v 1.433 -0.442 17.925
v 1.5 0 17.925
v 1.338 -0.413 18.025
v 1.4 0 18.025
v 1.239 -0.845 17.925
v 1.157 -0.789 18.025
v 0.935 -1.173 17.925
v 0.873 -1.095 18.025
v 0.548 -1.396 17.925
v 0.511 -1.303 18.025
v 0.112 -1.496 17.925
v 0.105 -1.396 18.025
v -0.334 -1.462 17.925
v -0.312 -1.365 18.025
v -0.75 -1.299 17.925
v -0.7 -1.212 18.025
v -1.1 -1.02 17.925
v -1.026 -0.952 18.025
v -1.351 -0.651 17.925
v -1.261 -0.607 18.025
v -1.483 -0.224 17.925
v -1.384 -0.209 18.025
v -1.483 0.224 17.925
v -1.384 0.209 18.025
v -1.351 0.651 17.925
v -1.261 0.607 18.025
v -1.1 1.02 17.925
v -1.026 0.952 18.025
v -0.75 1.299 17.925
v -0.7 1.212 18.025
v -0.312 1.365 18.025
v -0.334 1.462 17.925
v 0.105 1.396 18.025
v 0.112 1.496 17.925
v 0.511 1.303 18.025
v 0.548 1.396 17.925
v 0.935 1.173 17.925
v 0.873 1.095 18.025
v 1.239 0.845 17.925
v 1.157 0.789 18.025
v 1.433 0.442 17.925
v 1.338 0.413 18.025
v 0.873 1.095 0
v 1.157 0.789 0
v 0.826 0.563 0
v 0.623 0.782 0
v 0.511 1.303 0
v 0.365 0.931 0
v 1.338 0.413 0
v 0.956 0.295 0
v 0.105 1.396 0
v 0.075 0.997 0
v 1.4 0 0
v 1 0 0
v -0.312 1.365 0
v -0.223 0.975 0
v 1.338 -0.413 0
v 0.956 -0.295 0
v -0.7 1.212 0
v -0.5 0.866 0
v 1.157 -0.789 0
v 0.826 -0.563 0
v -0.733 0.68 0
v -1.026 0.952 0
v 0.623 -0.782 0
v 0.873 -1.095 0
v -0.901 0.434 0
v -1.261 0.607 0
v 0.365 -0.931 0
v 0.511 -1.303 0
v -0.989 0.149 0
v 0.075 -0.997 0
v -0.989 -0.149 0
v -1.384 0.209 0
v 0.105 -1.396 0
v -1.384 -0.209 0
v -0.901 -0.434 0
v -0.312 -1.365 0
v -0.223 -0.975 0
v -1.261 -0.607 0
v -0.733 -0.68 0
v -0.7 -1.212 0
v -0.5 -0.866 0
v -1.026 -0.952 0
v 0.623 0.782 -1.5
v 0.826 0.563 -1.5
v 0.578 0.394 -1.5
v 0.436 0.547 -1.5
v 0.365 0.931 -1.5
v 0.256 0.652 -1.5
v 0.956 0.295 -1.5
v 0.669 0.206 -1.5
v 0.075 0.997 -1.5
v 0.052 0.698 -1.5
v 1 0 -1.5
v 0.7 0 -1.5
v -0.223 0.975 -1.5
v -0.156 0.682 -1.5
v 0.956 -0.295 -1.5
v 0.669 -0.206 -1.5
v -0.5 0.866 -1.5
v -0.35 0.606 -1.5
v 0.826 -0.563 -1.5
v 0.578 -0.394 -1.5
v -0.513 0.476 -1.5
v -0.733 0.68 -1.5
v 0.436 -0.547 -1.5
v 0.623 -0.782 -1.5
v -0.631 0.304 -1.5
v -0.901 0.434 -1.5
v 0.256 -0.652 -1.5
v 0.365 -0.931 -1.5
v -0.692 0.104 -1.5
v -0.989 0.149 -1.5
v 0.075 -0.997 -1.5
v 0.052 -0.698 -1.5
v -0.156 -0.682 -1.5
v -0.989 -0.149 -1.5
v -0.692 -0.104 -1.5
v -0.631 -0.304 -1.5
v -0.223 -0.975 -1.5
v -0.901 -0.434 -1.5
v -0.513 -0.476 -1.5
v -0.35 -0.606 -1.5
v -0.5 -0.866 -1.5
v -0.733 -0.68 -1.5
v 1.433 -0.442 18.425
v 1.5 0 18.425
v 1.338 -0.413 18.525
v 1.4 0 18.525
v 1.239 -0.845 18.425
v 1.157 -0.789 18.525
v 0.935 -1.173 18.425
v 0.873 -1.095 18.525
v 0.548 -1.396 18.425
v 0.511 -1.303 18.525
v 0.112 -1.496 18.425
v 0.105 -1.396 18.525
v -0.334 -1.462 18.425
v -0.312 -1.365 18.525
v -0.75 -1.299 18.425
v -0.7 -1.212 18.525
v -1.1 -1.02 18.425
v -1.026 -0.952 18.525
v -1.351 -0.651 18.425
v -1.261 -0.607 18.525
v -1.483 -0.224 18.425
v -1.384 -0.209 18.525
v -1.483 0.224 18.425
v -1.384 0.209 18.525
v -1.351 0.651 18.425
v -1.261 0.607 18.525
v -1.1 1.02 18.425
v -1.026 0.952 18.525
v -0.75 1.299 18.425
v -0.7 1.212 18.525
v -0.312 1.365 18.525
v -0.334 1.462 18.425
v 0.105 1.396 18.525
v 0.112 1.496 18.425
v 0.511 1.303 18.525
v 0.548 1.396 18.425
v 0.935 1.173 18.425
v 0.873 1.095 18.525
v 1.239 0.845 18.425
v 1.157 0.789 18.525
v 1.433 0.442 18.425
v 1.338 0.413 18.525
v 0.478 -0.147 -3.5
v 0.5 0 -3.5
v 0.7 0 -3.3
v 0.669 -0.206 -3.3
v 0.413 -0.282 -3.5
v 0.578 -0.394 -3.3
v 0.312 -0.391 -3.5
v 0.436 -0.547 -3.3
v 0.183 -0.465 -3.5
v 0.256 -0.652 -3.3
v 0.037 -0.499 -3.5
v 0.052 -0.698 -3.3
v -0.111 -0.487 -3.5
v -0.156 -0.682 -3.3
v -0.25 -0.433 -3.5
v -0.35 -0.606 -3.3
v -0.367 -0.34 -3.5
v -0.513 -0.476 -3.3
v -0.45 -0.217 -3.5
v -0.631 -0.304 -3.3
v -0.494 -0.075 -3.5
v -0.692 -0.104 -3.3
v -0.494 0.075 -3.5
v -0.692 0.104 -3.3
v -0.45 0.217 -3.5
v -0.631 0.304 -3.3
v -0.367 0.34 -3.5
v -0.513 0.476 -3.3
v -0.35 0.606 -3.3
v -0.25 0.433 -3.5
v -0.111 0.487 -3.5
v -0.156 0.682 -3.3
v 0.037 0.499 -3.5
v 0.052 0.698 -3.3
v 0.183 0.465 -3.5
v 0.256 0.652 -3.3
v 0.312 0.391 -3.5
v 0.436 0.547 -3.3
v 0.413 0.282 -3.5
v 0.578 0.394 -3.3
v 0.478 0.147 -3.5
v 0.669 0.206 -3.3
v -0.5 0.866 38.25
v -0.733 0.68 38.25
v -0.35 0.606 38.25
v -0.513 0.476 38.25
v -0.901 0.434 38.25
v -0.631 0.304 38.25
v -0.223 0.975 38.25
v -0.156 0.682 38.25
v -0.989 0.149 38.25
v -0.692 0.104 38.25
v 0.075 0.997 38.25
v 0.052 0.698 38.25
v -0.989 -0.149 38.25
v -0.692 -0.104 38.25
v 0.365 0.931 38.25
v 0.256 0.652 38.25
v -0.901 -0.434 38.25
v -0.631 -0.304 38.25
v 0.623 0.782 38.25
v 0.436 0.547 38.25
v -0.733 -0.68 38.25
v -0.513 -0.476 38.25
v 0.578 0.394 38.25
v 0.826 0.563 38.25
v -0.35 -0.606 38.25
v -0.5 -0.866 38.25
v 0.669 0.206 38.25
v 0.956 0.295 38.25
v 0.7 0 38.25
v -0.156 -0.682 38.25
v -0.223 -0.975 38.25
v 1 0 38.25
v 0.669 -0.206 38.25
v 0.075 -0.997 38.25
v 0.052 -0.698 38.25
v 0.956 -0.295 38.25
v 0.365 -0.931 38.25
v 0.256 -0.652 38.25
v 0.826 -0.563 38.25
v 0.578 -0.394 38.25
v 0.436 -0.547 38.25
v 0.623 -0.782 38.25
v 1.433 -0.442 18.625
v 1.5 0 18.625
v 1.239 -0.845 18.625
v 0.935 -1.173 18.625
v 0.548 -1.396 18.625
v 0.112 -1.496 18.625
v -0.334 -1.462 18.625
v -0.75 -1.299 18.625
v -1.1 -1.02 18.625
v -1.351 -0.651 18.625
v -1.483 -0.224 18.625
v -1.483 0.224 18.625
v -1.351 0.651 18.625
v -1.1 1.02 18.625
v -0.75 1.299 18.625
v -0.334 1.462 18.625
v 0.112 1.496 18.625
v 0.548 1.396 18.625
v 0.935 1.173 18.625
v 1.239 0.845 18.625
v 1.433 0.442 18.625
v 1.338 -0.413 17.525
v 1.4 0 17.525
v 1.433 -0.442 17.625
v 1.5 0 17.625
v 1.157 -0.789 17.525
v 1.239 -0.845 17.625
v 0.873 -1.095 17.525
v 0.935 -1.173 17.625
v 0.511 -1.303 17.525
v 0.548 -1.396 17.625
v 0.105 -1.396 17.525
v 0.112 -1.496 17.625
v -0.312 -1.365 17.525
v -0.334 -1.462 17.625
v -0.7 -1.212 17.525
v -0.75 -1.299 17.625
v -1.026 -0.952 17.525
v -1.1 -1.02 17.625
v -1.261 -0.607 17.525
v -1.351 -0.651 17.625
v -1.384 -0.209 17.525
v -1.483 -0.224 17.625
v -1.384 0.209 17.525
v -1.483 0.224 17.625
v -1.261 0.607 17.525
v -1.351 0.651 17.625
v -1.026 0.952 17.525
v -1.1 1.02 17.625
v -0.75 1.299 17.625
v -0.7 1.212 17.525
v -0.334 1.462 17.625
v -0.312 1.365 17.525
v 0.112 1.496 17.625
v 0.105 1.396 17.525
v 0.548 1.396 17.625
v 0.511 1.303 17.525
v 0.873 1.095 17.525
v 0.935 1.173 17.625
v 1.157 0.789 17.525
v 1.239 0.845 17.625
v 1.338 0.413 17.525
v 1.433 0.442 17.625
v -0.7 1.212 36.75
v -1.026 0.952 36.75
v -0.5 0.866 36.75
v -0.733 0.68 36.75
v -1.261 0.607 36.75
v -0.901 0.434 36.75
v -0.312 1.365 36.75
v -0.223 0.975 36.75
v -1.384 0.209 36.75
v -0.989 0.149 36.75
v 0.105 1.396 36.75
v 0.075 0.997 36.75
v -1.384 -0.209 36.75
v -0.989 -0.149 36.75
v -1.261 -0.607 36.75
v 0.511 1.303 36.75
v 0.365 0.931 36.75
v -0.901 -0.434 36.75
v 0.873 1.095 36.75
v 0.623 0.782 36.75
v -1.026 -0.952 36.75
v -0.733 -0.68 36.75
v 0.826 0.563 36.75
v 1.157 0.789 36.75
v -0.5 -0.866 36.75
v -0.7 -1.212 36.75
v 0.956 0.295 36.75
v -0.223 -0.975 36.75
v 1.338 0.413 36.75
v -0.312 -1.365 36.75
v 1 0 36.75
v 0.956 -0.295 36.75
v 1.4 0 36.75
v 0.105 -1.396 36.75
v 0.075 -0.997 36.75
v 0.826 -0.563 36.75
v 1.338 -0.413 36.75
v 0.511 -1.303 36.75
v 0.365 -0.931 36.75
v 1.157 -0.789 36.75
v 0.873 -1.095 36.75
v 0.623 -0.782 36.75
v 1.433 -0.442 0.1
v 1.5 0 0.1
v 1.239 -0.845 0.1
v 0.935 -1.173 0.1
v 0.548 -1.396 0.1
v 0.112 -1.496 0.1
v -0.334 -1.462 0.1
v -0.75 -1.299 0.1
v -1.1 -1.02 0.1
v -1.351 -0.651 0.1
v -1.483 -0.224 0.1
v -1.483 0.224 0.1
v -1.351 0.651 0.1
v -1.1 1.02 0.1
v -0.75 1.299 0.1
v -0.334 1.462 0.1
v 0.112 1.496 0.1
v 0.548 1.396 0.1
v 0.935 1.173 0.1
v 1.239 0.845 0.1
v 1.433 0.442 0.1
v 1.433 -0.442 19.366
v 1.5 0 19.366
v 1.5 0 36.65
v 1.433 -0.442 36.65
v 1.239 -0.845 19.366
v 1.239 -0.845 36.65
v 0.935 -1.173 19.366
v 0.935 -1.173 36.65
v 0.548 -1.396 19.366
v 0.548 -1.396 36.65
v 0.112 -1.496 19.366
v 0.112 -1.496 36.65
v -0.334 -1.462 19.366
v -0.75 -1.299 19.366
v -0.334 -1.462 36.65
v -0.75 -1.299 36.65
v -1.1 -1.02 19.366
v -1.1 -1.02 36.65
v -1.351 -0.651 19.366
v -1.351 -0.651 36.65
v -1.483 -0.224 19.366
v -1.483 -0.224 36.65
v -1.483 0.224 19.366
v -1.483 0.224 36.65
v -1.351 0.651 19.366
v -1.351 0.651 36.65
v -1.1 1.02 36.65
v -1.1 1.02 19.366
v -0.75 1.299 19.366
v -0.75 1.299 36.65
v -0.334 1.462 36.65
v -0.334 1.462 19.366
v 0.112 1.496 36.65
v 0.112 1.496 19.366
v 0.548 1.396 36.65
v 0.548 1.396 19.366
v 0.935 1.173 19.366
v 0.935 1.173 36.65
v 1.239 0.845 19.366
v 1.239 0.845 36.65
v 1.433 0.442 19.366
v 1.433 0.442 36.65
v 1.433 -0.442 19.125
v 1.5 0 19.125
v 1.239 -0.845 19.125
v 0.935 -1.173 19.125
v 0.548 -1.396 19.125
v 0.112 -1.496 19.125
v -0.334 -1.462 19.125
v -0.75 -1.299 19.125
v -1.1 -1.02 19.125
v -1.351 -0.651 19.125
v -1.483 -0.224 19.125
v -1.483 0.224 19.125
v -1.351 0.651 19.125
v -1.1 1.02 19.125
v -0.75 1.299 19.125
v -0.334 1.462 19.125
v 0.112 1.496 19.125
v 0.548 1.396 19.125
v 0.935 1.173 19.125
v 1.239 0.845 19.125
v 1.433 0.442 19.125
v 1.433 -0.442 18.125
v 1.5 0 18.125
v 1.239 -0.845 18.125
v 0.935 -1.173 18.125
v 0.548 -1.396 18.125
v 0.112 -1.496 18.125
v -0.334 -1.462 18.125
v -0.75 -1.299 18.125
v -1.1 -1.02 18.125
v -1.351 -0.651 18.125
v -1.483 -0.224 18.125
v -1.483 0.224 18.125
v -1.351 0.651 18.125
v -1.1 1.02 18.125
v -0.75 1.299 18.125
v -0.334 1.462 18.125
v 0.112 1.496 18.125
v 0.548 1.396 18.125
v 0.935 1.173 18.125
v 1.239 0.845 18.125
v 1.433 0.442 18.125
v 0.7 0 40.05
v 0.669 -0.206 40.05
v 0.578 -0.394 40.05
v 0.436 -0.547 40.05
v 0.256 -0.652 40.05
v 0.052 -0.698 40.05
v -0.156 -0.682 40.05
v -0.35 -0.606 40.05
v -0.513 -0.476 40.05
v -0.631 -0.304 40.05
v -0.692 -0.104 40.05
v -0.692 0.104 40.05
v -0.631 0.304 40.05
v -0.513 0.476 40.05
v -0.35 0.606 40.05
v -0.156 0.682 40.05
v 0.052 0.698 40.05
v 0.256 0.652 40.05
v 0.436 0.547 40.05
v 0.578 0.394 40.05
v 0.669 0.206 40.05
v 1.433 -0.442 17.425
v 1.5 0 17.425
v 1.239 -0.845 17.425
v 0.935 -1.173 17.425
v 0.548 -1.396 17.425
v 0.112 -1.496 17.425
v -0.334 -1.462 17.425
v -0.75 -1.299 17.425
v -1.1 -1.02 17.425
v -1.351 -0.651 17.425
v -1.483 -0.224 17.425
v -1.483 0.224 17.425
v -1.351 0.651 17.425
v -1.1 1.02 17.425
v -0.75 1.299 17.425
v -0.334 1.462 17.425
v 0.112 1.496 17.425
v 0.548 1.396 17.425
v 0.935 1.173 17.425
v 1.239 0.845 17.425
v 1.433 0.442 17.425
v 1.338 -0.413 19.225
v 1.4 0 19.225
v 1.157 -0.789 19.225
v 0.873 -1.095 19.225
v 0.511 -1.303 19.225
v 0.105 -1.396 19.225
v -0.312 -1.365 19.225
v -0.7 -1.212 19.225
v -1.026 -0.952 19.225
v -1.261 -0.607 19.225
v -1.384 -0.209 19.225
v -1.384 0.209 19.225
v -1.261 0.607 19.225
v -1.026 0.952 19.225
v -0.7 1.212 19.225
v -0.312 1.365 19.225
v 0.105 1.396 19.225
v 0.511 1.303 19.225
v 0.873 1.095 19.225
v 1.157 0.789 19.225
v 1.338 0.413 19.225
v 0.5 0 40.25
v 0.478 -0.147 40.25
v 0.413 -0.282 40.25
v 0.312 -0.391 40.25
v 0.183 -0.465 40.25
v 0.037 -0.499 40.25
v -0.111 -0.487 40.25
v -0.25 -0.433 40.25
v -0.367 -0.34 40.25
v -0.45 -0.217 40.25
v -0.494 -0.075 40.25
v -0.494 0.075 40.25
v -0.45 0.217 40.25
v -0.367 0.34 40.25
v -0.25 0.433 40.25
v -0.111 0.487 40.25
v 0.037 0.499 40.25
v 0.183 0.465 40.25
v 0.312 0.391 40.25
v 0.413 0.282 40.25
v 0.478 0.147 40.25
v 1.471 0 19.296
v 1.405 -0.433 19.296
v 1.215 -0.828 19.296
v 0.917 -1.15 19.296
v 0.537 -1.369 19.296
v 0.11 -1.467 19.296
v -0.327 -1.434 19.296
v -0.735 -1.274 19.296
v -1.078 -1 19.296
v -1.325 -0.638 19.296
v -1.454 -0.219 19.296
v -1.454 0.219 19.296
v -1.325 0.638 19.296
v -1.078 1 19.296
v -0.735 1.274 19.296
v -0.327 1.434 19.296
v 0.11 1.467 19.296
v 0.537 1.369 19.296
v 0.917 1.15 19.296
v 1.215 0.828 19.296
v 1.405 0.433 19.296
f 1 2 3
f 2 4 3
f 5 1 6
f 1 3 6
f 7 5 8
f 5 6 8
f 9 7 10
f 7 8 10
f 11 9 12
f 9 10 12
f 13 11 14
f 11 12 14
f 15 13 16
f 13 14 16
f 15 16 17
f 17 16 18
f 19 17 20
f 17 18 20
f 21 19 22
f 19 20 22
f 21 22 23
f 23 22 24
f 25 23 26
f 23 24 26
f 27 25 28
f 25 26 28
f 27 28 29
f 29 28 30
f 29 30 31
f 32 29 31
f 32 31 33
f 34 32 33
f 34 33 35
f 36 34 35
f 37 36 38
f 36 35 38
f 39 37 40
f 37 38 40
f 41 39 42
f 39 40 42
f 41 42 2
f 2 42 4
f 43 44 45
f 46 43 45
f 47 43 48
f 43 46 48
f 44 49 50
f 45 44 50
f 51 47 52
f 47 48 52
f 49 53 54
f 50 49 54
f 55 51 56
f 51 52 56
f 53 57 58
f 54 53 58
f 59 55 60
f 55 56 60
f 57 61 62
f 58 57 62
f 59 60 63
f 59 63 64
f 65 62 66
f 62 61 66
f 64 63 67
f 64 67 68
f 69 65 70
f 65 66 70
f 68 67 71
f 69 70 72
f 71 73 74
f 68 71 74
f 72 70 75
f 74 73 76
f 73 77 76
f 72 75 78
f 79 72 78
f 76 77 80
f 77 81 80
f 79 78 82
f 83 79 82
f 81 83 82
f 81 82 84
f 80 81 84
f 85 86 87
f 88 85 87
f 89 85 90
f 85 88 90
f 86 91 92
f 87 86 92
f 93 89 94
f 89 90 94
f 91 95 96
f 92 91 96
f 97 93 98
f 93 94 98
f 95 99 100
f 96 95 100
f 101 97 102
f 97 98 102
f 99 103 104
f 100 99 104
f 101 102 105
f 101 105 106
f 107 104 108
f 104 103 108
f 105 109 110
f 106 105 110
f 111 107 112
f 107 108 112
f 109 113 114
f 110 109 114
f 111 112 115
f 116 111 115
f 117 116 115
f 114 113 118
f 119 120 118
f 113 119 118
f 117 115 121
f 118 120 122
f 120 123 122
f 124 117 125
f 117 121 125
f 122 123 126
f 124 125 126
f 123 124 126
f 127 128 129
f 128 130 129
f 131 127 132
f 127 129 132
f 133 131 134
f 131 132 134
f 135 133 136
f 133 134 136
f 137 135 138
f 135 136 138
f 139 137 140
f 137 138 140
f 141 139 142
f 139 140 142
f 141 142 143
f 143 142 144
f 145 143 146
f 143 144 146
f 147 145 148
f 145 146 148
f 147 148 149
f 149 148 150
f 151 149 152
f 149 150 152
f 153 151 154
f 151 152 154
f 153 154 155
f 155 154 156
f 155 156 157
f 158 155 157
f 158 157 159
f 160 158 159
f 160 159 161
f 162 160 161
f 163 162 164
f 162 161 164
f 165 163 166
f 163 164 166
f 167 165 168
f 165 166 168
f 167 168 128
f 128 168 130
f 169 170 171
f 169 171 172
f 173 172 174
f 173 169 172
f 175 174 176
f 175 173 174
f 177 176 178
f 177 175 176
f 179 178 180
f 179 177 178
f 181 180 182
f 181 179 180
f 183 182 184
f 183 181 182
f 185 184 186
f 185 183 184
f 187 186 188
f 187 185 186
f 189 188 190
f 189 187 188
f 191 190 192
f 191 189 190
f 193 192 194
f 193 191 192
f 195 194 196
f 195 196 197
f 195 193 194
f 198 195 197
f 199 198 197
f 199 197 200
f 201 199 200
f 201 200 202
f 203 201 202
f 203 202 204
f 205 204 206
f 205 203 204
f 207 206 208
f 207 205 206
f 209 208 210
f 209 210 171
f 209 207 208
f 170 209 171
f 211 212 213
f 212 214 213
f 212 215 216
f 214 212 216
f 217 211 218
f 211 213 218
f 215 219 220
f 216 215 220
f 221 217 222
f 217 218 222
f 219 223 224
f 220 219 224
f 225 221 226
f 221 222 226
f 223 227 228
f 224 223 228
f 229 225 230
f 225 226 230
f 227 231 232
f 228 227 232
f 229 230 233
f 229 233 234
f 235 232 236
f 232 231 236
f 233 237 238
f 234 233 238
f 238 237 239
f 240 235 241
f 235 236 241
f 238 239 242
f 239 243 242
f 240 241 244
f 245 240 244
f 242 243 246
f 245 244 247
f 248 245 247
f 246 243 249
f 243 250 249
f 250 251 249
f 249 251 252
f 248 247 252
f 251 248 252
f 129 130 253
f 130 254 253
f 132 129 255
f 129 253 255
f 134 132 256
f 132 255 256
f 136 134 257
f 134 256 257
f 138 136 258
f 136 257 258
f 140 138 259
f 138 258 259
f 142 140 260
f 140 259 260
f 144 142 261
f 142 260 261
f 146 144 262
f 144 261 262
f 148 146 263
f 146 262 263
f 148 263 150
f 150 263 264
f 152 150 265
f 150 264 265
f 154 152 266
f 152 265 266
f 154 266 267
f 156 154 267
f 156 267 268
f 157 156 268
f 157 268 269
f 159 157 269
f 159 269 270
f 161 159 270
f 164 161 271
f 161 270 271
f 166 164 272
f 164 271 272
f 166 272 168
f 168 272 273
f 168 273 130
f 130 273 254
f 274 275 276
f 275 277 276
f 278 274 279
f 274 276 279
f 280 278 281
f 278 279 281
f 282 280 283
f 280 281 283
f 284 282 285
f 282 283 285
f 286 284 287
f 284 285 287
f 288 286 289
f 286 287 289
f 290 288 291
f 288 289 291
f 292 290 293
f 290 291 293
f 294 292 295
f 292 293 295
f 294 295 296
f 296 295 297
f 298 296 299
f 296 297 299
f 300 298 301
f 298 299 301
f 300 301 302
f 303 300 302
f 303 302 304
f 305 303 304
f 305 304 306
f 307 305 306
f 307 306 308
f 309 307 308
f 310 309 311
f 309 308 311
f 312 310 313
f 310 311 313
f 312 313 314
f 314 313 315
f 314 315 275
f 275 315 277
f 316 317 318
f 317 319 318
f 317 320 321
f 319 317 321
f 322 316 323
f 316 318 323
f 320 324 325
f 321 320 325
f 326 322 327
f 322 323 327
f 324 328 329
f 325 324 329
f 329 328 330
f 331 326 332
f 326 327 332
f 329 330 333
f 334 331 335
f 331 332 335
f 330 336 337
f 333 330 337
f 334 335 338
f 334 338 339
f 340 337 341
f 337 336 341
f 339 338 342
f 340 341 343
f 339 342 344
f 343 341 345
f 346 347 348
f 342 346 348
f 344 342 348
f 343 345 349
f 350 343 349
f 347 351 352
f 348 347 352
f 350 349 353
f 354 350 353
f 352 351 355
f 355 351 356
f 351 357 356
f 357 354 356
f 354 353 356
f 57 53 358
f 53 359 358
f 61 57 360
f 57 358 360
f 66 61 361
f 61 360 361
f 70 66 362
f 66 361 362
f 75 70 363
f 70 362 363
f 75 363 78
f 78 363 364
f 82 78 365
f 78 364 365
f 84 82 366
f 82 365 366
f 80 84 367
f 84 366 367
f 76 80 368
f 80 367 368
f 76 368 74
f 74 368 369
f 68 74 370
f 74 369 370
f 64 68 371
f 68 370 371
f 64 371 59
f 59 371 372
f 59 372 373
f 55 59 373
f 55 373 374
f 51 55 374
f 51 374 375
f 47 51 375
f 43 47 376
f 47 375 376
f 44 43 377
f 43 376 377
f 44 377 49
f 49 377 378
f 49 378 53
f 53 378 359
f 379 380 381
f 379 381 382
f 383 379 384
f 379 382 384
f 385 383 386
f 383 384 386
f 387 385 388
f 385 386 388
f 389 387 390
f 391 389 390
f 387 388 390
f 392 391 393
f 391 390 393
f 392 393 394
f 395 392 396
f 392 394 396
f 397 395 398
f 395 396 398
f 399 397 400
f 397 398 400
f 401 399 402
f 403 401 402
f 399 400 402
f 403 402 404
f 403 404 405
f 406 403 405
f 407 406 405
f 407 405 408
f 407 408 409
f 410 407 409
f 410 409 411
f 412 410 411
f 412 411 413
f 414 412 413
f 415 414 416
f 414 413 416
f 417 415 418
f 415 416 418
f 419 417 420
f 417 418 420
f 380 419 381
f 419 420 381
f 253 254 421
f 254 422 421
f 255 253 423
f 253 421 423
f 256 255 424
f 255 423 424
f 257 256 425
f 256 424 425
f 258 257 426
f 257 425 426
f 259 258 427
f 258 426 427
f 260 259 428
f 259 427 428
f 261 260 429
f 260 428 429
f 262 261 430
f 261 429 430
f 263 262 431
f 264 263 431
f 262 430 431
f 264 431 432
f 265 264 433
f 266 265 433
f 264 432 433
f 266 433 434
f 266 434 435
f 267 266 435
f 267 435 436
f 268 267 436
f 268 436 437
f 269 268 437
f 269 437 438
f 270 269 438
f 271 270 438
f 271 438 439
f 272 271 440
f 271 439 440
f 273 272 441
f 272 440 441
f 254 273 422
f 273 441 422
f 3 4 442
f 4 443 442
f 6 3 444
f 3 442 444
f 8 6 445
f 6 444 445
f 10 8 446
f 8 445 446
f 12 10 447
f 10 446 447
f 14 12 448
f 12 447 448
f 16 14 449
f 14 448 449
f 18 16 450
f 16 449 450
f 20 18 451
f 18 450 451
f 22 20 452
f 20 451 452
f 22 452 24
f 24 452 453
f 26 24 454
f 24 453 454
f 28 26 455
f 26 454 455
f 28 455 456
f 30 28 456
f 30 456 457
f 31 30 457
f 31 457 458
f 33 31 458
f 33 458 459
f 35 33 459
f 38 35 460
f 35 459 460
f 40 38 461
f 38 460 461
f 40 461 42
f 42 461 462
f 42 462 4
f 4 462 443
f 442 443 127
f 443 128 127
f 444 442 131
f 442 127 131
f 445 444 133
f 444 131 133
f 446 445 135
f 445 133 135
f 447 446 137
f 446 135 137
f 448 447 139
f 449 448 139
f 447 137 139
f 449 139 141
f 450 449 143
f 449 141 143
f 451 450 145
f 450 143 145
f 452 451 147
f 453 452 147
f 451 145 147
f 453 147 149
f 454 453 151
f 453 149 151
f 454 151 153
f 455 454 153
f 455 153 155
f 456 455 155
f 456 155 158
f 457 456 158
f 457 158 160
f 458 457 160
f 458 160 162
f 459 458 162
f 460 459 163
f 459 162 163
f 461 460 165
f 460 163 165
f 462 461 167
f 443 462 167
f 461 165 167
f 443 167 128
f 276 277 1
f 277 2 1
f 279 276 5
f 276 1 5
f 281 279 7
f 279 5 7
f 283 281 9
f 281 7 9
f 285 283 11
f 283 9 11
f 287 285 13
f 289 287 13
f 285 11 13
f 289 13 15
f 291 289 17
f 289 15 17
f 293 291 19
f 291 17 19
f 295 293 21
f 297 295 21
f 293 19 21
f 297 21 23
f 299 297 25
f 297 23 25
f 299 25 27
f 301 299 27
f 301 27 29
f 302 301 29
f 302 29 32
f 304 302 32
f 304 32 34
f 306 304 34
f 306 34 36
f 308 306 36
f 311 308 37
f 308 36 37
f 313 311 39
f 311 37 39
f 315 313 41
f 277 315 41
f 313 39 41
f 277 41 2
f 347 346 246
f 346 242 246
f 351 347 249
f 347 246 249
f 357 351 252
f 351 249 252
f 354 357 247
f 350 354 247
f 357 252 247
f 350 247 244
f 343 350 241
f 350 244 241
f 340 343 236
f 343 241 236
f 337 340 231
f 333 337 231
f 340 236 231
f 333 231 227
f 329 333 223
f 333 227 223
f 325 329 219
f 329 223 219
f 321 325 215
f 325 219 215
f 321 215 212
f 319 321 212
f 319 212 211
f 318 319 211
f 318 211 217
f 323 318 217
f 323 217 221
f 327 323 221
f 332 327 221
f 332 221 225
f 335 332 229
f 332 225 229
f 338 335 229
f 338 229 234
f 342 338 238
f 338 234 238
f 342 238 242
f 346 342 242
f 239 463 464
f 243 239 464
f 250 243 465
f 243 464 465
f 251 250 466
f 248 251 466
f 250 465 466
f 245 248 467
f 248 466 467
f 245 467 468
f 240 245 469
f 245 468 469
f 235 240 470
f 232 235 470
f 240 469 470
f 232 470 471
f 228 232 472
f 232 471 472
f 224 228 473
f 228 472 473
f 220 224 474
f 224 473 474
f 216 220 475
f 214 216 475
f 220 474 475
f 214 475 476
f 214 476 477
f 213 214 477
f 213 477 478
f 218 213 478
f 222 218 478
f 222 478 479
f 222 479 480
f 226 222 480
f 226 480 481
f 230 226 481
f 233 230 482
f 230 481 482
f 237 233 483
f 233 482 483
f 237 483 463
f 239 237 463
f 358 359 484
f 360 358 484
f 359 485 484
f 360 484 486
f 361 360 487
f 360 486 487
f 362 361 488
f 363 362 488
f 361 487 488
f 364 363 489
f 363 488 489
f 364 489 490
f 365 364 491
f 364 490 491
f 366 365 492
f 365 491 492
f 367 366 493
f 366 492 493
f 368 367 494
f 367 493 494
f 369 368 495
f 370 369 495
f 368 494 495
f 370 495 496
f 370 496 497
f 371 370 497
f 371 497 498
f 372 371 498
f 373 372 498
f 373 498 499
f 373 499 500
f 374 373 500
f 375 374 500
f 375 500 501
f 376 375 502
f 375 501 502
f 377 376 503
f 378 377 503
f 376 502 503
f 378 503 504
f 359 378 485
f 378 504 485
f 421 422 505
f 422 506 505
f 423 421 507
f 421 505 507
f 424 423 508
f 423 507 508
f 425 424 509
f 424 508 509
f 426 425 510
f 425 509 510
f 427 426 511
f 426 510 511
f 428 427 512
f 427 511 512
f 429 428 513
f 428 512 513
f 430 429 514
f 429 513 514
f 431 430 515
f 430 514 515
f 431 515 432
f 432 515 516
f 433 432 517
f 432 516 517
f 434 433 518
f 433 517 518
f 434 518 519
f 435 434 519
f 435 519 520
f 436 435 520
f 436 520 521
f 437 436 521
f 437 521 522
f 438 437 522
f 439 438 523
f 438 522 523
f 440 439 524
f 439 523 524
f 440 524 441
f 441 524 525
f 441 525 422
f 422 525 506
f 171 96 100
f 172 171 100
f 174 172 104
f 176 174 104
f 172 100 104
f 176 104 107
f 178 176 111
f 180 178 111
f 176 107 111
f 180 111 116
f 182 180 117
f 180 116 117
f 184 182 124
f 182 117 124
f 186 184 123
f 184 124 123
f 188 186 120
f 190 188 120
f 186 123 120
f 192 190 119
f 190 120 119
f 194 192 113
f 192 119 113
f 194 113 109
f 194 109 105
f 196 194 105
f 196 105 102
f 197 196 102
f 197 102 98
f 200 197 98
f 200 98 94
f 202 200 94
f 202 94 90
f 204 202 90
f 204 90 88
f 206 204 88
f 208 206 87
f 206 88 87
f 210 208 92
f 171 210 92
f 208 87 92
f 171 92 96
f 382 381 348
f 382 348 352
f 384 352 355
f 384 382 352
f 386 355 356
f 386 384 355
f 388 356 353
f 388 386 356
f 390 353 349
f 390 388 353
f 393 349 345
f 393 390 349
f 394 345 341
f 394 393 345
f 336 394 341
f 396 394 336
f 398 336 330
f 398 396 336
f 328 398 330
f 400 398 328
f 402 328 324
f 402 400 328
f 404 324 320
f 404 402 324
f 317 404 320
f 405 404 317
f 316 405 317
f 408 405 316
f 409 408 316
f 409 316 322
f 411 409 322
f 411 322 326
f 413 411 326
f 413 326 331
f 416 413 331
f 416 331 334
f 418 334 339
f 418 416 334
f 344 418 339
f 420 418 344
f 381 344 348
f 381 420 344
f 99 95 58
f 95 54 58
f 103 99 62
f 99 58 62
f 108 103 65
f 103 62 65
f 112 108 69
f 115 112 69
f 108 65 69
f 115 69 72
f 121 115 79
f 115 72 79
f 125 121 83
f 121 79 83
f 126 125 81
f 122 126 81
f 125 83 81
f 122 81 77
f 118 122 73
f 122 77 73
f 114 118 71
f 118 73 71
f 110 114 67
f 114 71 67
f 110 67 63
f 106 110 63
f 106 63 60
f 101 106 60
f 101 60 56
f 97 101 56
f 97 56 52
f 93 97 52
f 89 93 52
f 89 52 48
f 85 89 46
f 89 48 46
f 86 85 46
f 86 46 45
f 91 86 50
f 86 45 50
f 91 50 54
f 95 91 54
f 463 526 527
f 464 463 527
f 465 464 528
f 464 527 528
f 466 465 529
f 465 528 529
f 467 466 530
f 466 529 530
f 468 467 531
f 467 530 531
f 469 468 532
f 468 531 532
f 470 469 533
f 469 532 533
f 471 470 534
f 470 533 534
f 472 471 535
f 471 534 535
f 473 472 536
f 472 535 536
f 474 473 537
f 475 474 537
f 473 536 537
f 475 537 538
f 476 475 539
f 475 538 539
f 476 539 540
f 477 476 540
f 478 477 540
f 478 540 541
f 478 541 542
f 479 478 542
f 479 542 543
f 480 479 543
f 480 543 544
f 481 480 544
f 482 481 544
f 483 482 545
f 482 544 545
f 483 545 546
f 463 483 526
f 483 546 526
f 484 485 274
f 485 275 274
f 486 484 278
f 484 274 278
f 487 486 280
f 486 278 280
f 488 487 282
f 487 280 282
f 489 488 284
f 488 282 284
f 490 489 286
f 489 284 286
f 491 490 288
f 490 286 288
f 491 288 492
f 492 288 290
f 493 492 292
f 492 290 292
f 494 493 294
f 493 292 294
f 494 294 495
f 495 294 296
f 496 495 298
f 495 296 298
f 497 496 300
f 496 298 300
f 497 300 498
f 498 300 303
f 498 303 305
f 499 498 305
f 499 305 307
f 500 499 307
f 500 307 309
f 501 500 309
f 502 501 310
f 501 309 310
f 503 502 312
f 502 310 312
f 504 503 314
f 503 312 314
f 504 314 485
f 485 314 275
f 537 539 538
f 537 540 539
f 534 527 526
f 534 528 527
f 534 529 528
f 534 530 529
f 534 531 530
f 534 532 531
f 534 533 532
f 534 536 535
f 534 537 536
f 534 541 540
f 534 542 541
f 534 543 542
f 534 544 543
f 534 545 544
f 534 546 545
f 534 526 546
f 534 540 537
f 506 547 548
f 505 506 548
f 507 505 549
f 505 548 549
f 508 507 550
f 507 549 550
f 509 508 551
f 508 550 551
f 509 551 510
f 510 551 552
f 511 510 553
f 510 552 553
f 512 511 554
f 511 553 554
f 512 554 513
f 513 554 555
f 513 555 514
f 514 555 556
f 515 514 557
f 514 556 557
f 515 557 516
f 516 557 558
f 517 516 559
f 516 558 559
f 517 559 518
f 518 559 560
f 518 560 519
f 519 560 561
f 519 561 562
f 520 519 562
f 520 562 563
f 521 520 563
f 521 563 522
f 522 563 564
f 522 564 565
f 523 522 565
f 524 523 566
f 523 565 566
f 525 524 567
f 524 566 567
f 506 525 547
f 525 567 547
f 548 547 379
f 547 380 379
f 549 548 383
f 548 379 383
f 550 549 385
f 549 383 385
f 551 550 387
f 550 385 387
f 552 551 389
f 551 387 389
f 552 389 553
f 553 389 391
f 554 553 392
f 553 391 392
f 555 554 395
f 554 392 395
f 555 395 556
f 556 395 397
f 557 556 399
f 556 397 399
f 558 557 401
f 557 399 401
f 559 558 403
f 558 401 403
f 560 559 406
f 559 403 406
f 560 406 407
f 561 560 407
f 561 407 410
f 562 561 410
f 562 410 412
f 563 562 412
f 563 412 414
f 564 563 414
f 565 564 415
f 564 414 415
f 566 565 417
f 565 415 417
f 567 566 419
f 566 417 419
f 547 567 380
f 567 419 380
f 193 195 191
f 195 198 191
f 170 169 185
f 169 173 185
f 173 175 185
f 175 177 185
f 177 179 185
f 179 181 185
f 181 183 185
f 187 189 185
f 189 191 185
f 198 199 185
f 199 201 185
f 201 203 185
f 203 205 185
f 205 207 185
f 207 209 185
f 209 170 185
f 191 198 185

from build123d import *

# Parameters (mm, degrees)
F0_W     = 0.7
F0_H     = 2
F2_SIZE2 = 0.2
F2_SIZE  = 0.2
F3_SIZE2 = 0.1
F3_SIZE  = 0.1
F4_SIZE2 = 0.2
F4_SIZE  = 0.2


# Not quite as in the source:
# - a fillet or chamfer that OpenCascade refuses, or shapes differently, is made with other operations: its cross-section is extruded or revolved along the edge and cut away or added


with BuildPart() as f1:
    # F0 (on Front) → F1 (revolve)
    with BuildSketch(Plane.XZ):
        Polygon((0, 38.25), (0, 36.75), (1, 36.75), (1, 38.25), (0.7, 38.25), align=None)
        Polygon((1, 36.75), (0, 36.75), (0, 0), (1, 0), (1.5, 0), (1.5, 17.425), (1.4, 17.525), (1.5, 17.625), (1.5, 17.925), (1.4, 18.025), (1.5, 18.125), (1.5, 18.425), (1.4, 18.525), (1.5, 18.625), (1.5, 19.125), (1.4, 19.225), (1.5, 19.325), (1.5, 36.75), align=None)
        with Locations((0.35, 39.25)):
            Rectangle(F0_W, F0_H)
        Polygon((1, 0), (0, 0), (0, -1.5), (0.7, -1.5), (1, -1.5), align=None)
        with Locations((0.35, -2.5)):
            Rectangle(F0_W, F0_H)
    revolve(axis=Axis((0, 0, 18.375), (0, 0, -1)))

    # F2
    f2_edges = [f1.edges().sort_by_distance(p)[0] for p in [
        (-0.7, 0, 40.25),
    ]]
    chamfer(f2_edges, length=F2_SIZE, length2=F2_SIZE2)

    # F3
    f3_edges = [f1.edges().sort_by_distance(p)[0] for p in [
        (-1.5, 0, 36.75),
    ]]
    chamfer(f3_edges, length=F3_SIZE, length2=F3_SIZE2)

    # F4
    f4_edges = [f1.edges().sort_by_distance(p)[0] for p in [
        (-0.7, 0, -3.5),
    ]]
    chamfer(f4_edges, length=F4_SIZE, length2=F4_SIZE2)

    # F5: chamfer of 0.1 on 2 edges, made by hand

    # F5_s1 → F5_t2 (revolve, cut)
    with BuildSketch(Plane.XZ):
        Polygon((1.4, 0), (1.5, 0.1), (1.5, 0), align=None)
    revolve(axis=Axis((0, 0, 0), (0, 0, -1)), mode=Mode.SUBTRACT)

    # F5_s3 → F5_t4 (revolve, cut)
    with BuildSketch(Plane.XZ):
        Polygon((1.4707106781, 19.2957106781), (1.5, 19.3664213562), (1.5, 19.325), align=None)
    revolve(axis=Axis((0, 0, 19.325), (0, 0, -1)), mode=Mode.SUBTRACT)


solid = f1.part
